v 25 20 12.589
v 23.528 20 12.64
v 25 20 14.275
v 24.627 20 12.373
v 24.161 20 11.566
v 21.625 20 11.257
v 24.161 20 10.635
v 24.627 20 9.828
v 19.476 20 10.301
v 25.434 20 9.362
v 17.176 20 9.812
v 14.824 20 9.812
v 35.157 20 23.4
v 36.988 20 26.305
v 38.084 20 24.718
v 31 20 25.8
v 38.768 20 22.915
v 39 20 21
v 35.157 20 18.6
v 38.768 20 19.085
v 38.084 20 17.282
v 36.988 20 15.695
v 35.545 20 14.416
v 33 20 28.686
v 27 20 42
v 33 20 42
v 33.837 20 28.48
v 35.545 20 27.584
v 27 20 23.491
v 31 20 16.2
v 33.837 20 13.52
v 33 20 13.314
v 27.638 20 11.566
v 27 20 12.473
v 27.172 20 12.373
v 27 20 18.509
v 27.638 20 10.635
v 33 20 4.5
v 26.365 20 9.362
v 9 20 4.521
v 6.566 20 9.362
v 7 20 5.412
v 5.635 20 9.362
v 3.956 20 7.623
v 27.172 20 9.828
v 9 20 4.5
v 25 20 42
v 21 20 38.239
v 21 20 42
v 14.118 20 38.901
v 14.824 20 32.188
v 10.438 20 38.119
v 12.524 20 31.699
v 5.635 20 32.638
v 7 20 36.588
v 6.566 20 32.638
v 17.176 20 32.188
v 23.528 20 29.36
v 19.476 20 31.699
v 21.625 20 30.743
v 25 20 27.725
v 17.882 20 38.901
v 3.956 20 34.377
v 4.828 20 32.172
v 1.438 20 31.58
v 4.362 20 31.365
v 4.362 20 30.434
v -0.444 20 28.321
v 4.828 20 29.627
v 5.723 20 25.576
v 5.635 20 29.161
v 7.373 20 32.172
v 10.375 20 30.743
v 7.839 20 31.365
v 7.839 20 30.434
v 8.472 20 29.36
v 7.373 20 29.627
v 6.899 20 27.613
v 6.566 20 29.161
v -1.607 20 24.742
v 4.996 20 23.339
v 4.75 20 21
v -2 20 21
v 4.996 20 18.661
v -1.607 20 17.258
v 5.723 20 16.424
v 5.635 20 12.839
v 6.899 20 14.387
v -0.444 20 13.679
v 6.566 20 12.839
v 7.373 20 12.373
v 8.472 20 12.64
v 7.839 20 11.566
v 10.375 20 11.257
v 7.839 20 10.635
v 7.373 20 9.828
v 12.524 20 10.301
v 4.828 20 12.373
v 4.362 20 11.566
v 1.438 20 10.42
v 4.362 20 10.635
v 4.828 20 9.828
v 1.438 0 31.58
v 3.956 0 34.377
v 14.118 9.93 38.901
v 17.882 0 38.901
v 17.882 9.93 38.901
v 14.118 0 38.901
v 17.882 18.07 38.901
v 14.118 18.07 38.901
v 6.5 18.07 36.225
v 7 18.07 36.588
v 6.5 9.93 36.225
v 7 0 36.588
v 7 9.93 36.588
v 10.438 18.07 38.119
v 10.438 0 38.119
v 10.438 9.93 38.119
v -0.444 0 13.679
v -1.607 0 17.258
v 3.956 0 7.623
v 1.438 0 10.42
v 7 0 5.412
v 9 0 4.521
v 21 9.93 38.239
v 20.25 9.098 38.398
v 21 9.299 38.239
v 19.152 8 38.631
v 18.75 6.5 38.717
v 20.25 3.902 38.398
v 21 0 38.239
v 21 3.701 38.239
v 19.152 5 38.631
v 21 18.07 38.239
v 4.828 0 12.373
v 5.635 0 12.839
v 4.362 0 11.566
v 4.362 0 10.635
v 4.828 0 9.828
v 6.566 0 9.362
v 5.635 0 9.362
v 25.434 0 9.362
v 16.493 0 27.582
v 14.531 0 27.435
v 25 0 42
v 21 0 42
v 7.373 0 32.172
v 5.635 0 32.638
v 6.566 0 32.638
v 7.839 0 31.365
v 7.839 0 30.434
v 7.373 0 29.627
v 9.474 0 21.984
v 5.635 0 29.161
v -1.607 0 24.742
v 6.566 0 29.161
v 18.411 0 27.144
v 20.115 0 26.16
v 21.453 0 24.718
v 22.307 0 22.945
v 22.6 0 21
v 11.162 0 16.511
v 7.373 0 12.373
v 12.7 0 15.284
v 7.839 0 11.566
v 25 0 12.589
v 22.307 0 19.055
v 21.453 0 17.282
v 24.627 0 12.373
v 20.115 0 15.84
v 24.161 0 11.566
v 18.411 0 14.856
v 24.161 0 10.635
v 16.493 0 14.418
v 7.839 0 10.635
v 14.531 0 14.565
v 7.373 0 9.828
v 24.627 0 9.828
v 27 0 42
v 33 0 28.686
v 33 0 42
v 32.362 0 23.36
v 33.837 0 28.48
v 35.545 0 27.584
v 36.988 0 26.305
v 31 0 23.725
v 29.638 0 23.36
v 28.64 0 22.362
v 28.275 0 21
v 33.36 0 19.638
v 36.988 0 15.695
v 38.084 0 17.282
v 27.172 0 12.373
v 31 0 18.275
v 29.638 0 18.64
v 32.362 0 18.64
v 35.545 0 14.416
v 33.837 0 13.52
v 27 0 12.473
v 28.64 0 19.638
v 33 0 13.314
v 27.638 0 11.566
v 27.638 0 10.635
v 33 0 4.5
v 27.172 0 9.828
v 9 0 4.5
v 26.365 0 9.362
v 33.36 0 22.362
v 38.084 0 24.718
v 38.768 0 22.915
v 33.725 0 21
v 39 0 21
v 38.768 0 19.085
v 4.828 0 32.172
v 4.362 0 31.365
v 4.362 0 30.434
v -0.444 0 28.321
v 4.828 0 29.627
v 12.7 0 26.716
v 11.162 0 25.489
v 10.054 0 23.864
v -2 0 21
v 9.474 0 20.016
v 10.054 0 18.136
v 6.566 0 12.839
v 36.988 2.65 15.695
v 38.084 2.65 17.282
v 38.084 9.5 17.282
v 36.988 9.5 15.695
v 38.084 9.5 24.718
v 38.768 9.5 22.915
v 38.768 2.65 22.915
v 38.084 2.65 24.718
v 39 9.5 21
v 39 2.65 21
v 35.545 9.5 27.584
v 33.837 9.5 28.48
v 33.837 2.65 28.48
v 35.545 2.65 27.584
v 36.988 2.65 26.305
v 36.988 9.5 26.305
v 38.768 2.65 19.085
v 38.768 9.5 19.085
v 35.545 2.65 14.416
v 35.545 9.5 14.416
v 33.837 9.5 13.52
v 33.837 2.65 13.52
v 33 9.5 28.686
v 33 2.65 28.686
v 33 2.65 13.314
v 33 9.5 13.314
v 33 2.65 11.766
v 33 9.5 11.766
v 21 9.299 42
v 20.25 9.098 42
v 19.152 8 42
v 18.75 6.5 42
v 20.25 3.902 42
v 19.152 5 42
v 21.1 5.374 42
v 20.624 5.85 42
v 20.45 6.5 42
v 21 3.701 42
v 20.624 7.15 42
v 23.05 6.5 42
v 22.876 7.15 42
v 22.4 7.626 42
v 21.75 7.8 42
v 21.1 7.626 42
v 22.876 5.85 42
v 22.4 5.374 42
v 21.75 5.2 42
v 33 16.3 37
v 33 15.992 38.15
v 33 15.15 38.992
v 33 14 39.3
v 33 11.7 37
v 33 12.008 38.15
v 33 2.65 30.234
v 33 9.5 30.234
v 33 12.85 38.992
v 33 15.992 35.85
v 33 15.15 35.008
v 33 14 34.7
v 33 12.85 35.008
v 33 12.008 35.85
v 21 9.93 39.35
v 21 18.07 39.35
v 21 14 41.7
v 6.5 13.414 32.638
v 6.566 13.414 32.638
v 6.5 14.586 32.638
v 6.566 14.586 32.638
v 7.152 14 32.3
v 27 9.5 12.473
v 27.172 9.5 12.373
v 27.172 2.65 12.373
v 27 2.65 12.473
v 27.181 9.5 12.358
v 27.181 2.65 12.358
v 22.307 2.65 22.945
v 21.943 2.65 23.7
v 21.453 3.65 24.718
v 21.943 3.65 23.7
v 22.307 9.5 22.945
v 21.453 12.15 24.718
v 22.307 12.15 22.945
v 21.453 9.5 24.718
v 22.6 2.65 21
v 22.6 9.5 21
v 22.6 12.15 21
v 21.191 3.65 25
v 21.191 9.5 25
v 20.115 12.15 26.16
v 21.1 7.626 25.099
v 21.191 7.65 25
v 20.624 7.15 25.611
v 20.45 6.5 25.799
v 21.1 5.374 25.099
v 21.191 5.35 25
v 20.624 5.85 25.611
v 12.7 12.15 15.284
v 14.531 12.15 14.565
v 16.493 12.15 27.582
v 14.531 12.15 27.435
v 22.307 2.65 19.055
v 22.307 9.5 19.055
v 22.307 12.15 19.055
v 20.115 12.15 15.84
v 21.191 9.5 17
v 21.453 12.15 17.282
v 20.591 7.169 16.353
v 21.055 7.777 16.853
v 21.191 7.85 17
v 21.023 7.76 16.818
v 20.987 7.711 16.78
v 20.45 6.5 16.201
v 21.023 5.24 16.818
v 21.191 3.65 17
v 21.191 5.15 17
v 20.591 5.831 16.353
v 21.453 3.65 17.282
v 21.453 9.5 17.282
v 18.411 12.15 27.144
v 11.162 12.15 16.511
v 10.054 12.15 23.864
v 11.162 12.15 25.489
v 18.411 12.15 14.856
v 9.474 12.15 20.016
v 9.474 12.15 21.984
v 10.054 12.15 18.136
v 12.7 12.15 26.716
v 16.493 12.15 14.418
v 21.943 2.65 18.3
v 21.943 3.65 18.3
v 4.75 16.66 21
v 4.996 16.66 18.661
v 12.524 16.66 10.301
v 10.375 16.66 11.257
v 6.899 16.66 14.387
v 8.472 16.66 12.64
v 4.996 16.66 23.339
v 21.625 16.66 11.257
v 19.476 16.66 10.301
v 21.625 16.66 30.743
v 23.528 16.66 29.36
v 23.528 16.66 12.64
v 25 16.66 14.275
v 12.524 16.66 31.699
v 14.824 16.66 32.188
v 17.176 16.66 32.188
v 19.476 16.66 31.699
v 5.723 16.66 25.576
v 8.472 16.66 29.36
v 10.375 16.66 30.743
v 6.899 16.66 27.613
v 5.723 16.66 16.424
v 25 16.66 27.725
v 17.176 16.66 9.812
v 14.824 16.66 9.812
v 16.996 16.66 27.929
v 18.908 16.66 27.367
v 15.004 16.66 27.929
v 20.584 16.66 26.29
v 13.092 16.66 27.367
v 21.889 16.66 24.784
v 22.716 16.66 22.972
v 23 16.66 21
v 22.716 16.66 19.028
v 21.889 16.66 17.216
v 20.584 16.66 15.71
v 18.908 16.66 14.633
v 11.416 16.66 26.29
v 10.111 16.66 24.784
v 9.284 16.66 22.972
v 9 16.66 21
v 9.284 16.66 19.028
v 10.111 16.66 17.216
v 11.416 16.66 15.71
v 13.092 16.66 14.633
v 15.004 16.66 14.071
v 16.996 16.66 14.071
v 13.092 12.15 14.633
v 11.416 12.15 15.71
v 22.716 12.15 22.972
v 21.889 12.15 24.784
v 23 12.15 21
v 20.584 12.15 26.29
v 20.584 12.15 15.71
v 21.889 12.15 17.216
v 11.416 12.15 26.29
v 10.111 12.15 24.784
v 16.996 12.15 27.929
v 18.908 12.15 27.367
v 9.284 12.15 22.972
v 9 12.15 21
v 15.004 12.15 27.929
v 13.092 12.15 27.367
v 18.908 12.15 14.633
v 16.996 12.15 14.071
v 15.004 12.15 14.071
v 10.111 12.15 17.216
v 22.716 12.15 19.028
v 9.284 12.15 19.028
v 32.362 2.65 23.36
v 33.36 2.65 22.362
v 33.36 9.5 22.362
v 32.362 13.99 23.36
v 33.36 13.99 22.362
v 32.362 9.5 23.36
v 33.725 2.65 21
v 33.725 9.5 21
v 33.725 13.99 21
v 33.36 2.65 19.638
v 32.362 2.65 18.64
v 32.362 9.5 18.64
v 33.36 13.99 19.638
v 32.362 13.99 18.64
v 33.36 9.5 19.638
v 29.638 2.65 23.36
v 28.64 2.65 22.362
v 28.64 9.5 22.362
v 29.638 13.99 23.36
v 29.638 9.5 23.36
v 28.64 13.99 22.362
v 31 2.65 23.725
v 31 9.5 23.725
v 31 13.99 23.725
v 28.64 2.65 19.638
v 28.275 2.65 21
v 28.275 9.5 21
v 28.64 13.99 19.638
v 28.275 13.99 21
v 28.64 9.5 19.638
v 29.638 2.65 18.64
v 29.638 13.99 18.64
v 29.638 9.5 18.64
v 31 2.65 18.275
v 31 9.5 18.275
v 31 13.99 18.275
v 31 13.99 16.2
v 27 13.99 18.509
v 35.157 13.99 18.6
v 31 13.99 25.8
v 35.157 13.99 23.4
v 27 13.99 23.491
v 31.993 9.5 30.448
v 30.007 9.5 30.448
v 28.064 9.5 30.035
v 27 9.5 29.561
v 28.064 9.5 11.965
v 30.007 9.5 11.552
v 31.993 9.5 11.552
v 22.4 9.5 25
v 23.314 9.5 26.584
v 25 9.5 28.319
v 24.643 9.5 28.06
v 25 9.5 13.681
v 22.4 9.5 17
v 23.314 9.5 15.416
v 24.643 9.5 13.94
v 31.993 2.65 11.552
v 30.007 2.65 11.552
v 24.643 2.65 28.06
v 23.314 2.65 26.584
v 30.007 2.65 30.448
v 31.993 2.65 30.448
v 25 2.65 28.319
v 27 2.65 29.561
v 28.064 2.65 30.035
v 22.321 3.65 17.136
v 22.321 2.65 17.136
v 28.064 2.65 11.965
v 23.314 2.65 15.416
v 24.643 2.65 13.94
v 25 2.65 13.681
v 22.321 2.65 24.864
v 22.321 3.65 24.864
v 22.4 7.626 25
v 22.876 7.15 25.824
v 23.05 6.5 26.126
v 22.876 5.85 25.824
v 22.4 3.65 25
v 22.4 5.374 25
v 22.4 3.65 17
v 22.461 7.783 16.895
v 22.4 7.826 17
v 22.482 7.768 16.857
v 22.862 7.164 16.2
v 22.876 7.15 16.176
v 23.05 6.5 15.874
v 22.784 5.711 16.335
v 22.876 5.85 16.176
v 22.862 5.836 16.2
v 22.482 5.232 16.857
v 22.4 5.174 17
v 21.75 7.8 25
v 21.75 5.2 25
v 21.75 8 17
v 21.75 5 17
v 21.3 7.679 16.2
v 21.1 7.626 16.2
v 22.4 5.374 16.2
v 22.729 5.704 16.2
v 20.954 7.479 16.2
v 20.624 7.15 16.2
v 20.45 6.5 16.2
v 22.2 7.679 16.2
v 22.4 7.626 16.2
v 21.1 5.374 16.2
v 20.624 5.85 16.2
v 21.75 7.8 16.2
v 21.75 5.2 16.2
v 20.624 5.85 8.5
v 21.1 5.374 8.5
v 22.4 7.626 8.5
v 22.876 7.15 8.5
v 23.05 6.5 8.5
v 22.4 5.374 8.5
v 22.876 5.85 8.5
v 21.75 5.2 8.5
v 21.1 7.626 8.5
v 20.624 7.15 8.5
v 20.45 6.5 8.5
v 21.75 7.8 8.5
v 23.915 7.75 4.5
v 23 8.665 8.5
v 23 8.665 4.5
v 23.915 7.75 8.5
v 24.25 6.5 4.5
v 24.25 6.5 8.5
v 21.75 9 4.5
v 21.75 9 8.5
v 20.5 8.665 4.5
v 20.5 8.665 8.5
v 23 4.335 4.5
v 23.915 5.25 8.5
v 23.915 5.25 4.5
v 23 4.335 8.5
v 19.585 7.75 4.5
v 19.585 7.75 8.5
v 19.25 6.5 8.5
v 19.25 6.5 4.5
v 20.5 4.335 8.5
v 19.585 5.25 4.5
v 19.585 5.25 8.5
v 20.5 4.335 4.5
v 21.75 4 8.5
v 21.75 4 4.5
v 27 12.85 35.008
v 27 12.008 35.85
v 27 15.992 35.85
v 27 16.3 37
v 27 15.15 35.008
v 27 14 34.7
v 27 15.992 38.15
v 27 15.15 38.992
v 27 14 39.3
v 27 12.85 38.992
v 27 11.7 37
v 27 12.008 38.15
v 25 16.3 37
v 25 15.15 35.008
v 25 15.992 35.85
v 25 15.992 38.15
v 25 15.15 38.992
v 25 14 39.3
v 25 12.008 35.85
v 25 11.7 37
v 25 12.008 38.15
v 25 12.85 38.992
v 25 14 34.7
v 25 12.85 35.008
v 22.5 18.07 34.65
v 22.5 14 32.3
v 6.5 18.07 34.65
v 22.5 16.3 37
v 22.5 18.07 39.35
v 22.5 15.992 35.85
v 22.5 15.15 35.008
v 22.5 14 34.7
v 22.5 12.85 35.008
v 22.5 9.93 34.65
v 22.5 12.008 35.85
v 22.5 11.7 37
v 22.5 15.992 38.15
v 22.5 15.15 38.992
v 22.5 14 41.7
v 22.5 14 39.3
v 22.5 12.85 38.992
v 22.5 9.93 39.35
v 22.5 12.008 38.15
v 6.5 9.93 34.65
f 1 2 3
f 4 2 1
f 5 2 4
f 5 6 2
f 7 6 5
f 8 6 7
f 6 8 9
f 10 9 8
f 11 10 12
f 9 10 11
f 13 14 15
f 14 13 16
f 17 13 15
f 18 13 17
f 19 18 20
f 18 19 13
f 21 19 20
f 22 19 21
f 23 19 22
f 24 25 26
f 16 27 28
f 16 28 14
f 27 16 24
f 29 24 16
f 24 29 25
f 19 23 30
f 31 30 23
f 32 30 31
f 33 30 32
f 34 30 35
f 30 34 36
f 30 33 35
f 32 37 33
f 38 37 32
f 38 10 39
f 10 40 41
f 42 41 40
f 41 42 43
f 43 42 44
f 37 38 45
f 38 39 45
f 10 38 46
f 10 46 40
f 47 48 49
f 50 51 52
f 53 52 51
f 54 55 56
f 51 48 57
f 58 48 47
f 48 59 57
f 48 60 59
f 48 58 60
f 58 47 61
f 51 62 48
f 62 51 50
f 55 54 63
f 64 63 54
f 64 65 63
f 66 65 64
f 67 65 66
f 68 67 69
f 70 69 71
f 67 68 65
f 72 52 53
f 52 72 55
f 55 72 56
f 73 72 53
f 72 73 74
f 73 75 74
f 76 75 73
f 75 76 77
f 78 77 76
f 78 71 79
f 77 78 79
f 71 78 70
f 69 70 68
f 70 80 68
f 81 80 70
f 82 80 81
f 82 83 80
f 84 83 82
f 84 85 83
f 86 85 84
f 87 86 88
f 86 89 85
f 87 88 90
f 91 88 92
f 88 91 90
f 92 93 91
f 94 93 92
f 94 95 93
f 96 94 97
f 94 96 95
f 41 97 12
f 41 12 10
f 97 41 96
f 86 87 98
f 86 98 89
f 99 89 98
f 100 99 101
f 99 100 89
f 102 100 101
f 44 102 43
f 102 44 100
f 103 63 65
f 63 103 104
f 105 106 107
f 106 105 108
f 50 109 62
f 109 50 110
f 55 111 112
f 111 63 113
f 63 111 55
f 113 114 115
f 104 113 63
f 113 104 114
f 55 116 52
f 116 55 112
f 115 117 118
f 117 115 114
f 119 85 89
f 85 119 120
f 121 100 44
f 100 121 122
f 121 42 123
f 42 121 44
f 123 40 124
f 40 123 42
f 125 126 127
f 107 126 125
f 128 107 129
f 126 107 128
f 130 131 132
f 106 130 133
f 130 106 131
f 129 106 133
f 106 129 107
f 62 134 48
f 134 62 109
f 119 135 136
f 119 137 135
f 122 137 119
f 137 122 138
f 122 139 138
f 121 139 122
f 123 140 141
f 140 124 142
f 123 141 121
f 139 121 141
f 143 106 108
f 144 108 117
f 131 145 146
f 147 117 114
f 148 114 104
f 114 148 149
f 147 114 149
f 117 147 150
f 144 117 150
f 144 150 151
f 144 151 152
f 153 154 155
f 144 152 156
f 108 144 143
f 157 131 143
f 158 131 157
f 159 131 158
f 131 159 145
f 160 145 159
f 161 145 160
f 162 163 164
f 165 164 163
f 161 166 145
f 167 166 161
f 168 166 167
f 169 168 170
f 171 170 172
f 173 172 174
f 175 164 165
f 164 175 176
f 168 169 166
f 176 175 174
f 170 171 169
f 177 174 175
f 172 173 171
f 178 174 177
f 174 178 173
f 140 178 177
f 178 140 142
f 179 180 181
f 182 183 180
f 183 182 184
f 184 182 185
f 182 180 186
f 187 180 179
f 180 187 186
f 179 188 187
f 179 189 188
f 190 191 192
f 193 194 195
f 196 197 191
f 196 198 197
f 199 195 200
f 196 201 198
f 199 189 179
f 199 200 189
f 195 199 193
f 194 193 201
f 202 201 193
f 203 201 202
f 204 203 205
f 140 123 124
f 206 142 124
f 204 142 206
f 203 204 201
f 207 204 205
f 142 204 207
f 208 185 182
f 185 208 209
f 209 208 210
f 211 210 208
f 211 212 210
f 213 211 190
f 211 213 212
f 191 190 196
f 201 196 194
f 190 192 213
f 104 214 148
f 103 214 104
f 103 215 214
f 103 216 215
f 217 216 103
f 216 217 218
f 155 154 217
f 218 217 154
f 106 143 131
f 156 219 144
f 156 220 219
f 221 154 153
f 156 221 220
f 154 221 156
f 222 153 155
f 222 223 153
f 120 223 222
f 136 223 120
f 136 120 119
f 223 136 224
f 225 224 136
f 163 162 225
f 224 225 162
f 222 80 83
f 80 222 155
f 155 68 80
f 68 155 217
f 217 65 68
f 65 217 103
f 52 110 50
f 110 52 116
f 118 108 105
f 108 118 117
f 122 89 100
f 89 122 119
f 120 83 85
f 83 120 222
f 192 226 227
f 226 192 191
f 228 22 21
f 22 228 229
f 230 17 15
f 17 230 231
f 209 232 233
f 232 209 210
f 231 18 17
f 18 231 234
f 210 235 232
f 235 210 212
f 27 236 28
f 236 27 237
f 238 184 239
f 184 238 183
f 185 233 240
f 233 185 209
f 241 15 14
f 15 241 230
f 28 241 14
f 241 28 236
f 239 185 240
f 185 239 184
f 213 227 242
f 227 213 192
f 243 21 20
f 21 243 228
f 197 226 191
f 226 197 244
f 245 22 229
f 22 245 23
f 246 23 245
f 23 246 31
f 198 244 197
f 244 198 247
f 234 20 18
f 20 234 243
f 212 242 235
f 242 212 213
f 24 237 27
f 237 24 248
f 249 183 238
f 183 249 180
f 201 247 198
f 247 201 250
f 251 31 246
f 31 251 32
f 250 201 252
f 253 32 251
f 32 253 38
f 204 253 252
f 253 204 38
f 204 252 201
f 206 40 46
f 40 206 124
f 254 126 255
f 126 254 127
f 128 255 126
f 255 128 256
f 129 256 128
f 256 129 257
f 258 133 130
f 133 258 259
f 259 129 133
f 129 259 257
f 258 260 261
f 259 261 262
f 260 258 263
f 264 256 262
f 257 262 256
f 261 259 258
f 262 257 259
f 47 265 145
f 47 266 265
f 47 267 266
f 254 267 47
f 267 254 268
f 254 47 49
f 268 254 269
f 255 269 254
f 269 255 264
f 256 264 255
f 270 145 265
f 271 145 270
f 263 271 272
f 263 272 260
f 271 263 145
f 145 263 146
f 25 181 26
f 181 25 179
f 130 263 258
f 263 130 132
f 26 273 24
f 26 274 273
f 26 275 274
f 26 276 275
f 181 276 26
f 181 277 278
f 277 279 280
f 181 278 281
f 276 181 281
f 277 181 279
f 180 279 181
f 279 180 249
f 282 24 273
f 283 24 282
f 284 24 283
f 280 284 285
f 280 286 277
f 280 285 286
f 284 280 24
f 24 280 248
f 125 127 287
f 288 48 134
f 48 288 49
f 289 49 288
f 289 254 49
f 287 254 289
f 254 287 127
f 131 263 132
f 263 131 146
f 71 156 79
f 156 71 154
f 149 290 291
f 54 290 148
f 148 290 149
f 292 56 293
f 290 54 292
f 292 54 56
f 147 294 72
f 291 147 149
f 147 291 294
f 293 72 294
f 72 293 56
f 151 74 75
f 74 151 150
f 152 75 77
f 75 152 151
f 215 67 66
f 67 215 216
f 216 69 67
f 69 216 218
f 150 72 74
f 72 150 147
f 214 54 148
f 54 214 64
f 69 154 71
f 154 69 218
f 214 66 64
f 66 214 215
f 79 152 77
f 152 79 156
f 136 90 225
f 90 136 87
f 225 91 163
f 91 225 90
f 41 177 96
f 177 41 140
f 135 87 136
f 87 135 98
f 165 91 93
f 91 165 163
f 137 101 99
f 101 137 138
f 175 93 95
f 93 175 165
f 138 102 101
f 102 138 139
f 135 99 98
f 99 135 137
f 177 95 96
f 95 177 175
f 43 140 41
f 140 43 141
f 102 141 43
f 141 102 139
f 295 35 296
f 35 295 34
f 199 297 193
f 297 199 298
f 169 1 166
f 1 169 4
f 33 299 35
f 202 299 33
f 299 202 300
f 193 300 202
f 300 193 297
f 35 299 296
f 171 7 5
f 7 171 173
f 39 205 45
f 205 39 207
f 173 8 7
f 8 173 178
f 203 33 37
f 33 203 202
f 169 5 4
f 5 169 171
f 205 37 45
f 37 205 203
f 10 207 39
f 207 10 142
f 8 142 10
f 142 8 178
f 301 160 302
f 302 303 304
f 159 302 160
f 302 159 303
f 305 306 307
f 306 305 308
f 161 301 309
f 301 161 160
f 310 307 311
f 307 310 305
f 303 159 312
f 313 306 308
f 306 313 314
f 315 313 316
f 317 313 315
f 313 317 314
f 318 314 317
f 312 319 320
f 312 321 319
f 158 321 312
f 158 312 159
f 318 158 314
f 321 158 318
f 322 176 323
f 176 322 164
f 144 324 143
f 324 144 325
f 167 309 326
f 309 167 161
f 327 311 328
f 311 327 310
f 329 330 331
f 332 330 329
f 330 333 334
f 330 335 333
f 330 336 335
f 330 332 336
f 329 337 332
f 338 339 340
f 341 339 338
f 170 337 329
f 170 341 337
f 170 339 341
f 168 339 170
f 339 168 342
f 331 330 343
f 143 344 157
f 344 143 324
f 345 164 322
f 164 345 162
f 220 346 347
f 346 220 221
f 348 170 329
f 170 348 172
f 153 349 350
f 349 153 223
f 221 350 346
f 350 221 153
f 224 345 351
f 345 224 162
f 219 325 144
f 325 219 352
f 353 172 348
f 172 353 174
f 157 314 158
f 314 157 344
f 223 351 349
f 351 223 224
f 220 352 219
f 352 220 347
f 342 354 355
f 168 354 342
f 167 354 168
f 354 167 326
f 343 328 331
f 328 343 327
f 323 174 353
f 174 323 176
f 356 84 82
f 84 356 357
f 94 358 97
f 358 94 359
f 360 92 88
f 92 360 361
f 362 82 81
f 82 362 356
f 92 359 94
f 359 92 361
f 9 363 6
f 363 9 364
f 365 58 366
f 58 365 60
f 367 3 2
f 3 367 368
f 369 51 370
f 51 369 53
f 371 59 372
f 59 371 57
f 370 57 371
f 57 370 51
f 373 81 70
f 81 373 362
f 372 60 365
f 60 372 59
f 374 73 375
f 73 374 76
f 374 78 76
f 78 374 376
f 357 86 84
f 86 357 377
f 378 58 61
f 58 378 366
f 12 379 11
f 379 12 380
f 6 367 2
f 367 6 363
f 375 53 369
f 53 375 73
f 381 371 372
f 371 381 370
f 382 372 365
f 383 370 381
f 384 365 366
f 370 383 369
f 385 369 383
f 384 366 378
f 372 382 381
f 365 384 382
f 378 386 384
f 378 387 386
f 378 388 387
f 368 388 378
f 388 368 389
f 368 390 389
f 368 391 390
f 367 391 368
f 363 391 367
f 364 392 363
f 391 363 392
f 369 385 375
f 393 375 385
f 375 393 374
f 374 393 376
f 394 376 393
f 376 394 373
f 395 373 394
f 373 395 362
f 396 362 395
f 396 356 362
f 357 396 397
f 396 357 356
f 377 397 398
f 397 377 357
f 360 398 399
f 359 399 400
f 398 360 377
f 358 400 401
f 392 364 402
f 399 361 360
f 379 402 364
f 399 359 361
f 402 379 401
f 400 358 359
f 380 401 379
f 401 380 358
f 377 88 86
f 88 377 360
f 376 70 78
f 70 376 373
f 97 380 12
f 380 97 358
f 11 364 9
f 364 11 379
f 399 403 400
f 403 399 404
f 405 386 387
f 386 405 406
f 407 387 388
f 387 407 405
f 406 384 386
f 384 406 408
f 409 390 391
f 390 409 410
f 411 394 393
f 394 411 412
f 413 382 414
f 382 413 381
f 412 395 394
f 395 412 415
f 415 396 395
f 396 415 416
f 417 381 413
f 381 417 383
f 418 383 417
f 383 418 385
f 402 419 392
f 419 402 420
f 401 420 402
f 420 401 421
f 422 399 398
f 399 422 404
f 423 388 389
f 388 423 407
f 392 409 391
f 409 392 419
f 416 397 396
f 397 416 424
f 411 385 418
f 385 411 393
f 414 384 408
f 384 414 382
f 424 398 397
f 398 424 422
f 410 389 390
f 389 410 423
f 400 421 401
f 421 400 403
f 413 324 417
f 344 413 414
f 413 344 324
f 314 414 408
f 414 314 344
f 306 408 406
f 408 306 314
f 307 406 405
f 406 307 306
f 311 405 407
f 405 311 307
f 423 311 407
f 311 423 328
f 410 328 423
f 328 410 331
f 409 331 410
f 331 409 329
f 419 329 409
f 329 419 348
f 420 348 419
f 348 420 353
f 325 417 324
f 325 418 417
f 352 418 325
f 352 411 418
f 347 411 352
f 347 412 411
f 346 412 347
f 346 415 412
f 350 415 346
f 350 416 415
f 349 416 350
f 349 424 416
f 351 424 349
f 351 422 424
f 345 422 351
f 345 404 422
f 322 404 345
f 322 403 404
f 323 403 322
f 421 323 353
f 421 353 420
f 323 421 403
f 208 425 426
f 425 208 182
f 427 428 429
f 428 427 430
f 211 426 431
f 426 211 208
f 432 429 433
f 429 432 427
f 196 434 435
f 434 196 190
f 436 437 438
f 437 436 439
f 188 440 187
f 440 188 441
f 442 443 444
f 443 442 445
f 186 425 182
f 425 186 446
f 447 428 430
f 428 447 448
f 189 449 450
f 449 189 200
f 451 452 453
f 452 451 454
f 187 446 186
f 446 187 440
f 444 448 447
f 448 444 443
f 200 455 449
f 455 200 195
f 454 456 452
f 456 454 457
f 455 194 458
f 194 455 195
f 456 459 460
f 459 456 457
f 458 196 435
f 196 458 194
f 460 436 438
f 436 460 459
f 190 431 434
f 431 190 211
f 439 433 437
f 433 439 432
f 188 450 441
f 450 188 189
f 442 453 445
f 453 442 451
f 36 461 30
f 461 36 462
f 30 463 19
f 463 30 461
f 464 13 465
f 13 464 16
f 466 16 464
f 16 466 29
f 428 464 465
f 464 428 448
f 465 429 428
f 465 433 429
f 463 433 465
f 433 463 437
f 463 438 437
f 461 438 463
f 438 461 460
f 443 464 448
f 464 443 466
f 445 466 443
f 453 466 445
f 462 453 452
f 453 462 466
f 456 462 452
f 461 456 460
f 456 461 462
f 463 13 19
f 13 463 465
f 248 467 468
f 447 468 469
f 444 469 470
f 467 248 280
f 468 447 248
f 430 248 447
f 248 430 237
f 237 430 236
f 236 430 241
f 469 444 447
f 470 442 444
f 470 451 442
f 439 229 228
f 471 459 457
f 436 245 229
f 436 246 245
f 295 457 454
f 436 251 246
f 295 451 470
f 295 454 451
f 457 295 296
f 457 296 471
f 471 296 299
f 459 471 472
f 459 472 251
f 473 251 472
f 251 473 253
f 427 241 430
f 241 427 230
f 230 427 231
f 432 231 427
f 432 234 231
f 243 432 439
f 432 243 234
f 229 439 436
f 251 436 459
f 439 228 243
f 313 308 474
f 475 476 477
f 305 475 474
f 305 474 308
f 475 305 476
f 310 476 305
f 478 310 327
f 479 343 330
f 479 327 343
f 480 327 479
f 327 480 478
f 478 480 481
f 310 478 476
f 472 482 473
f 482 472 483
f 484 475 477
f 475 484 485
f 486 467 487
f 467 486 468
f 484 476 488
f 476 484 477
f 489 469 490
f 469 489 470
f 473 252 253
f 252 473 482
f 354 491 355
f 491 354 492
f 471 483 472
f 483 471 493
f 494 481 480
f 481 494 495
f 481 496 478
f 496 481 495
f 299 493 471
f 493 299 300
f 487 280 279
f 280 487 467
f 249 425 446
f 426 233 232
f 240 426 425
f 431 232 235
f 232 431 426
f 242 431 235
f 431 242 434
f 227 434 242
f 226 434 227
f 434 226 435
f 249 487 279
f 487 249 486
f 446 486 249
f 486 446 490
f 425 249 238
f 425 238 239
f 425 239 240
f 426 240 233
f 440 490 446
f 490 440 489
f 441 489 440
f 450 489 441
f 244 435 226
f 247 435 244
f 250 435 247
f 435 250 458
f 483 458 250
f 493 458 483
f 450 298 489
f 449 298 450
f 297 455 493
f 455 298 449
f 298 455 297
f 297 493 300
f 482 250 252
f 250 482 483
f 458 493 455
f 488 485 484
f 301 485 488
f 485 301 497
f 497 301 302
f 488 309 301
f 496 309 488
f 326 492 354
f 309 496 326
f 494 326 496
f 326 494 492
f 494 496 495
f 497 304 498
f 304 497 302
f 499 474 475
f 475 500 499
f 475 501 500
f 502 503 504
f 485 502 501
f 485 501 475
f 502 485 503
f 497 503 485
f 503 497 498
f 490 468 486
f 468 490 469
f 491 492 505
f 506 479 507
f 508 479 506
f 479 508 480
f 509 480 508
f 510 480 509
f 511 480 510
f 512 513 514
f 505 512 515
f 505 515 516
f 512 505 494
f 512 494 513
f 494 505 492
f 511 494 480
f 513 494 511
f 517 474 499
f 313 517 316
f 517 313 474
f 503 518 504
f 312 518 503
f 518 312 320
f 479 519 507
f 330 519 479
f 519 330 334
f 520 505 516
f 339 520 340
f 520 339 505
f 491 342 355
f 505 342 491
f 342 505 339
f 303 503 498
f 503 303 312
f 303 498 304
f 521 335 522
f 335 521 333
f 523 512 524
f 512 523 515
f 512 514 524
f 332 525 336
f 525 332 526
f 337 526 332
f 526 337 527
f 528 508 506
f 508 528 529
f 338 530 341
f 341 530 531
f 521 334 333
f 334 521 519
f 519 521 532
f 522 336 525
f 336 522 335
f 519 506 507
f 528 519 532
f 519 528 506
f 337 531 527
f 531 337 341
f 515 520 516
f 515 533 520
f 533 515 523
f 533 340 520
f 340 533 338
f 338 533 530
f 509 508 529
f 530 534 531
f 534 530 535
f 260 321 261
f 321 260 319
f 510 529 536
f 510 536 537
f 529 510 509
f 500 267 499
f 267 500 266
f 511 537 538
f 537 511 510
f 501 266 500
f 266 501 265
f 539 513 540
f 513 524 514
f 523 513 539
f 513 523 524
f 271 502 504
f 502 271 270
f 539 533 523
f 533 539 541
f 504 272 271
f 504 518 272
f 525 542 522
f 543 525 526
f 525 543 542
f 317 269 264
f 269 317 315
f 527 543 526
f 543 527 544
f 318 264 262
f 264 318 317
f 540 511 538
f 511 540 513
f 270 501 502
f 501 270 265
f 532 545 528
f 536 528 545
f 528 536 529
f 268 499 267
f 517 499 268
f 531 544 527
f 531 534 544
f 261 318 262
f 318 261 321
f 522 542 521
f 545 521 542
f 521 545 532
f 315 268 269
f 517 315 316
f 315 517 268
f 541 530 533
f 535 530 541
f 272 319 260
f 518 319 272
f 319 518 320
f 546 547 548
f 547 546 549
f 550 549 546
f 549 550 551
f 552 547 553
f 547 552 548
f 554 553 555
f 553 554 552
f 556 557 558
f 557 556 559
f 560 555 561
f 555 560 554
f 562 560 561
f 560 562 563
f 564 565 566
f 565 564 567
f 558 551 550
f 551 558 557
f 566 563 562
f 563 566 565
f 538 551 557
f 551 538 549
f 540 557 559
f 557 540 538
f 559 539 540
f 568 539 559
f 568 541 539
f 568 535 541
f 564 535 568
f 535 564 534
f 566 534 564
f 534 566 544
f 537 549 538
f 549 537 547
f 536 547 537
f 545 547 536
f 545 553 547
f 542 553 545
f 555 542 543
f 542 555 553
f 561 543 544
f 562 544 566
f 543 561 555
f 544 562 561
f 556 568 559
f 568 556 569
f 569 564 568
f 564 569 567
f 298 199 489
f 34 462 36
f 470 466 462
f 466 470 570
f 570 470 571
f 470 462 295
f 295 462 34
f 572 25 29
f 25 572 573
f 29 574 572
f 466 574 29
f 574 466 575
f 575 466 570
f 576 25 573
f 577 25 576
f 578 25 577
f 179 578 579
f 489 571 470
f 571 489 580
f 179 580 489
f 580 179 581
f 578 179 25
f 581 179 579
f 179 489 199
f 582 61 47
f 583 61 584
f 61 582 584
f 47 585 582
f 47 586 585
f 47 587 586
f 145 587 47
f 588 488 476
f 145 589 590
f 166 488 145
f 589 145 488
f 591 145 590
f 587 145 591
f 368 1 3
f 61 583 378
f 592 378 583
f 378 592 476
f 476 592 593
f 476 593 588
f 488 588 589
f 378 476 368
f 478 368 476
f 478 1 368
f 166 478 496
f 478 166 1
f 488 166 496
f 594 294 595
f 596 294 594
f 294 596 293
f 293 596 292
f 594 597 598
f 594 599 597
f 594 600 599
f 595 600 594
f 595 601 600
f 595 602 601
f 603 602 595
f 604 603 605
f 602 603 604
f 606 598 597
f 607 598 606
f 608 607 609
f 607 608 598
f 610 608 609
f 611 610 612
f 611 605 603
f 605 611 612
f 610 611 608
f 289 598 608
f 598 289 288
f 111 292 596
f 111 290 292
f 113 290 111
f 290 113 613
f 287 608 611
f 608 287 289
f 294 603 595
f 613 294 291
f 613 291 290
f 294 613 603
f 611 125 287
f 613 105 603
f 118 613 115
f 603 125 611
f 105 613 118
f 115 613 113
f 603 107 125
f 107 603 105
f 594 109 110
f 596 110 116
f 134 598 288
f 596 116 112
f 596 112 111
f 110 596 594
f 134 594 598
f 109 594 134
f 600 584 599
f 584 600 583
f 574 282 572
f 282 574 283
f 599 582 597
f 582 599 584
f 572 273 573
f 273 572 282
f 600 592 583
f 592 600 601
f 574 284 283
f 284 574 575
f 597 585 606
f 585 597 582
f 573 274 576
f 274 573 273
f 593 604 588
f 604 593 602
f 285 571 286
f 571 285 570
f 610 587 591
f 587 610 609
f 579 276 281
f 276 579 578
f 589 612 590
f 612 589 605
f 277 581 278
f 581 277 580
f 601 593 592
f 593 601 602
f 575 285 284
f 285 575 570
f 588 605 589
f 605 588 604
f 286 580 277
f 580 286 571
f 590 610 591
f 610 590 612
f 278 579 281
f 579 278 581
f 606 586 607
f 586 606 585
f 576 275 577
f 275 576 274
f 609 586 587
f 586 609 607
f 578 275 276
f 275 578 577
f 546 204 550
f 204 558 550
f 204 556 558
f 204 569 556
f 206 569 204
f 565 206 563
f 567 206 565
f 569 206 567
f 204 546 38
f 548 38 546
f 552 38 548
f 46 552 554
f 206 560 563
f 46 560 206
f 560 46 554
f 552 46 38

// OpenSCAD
first_layer = 0.3;

difference() {
	
	union() {
		//main cylinder
		translate([16,20,21]) rotate([90,0,0]) cylinder(h=20, r=18);//cube([44, 20, 42]);
		
		//bearing mount
		translate([31,20,21]) rotate([90,0,0]) cylinder (h=20, r=8);
		
		//V3 Mount
		translate([9,0,-7]) cube([24, 20, 22]);
		translate([21,first_layer/2,-11]) rotate([90,0,0]) cube([24, 22, first_layer], center=true);
		//translate([27,first_layer/2,45]) rotate([90,0,0]) cube([12, 22, first_layer], center=true);
		
		//filament support
		translate([21.75,6.5,34]) rotate([0,0,0]) cylinder (h=8, r=3, $fn=12);
		
		//groovemount supports
//		translate([33,6.5,-7]) rotate([0,0,0]) cylinder (h=16, r=5, $fn=12);
//		translate([9,6.5,-7]) rotate([0,0,0]) cylinder (h=16, r=5, $fn=12);
		
		//clamp
		translate([21,0,28]) cube([12, 20, 14]);
	}
	
	//pulley opening
	translate([16,21,21]) rotate([90,0,0]){
		cylinder (h=22, r=6.6);
		
		rotate([0,0,45]) {
		//translate([14,0,0]) cylinder(h=22, r=1.6, $fn=12);
		translate([0,14,0]) cylinder(h=22, r=1.8, $fn=12);
		translate([-14,0,0]) cylinder(h=22, r=1.8, $fn=12);
		translate([0,-14,0]) cylinder(h=22, r=1.8, $fn=12);
		}
	}
	
	//gearhead indentation
	translate([16,20.01,21]) rotate([90,0,0]) cylinder (h=3.35, r=11.25);

	//pulley hub indentation
	translate([16,20-2,21]) rotate([90,0,0]) cylinder (h=5.85, r=7);
	
	//bearing screws
	translate([31,21,21]) rotate([90,0,0]) cylinder (h=22, r=2.725, $fn=12); //precision m5

	//translate([31,21,21]) rotate([90,0,0]) cylinder (h=22, r=2.6, $fn=12); //regular M5 screw
	//translate([31,22,21]) rotate([90,30,0]) cylinder (h=8.01, r=8.1/2, $fn=6); //M4
	translate([31,22,21]) rotate([90,30,0]) cylinder (h=8.01, r=4.8, $fn=6); //M5
	
	//bearing
	translate([31,9.5,21]) rotate([90,0,0]) cylinder (h=6.85, r=9.5);
	//translate([25,9.5-5.25,21-8.25-2]) cube([20, 5.85, 18.5]);
	
	//opening between bearing and pulley
	translate([20,9.5-5.85,21-8.25+3.25+1]) cube([10, 5.85, 8]);

	//filament path chamfer
	translate([21.75,6.5,15]) rotate([0,0,0]) cylinder (h=2, r1=1, r2=1.5, $fn=12);		

	translate([31,9.5,21]) rotate([90,0,0]) cylinder (h=5.85, r=8.5);

	
	//filament path
	translate([21.75,6.5,-10]) rotate([0,0,0]) cylinder (h=60, r=1.3, $fn=12); 
	translate([21.75,6.5,-51.5]) rotate([0,0,0]) cylinder (h=60, r=2.5, $fn=12); 
	
	//V3 Mount
//	translate([21.75,6.5,-2]) rotate([0,0,0]) cylinder (h=5, r=8.25);
	translate([21.75,6.5,-7]) rotate([0,0,0]) cylinder (h=8, r=4.5);
//	translate([21.75-8,6.5-8,-2]) cube([16, 8, 5]);
//	translate([21.75-6,6.5-7,-7]) cube([12, 7, 5]);
	translate([21.75,6.5,3.5]) rotate([90,0,0]) cylinder (h=10, r=1,  $fn=12);
	
	//groovemount supports
//	translate([33,6.5,-8]) rotate([0,0,0]) cylinder (h=20, r=1.6, $fn=12);
//	translate([33,6.5,7]) rotate([0,0,0]) cylinder (h=3, r=3.5, $fn=6);

//	translate([9,6.5,-8]) rotate([0,0,0]) cylinder (h=20, r=1.6, $fn=12);
//	translate([9,6.5,7]) rotate([0,0,0]) cylinder (h=3, r=3.5, $fn=6);
//	translate([3,3,7]) cube([8, 7, 3]);
	
	//clamp slit
	translate([25,-1,10]) cube([2, 22, 35]);
	//clamp nut
	translate([6.5,14,37]) rotate([0,90,0]) cylinder (h=16, r=4.7, $fn=6);
	//clamp screw hole
	translate([15,14,37]) rotate([0,90,0]) cylinder (h=20, r=2.3, $fn=12);
	
	translate([9,-2,-25.5])cube(30,20,10);
    translate([9,-2,43.5])cube(30,20,10);
}
